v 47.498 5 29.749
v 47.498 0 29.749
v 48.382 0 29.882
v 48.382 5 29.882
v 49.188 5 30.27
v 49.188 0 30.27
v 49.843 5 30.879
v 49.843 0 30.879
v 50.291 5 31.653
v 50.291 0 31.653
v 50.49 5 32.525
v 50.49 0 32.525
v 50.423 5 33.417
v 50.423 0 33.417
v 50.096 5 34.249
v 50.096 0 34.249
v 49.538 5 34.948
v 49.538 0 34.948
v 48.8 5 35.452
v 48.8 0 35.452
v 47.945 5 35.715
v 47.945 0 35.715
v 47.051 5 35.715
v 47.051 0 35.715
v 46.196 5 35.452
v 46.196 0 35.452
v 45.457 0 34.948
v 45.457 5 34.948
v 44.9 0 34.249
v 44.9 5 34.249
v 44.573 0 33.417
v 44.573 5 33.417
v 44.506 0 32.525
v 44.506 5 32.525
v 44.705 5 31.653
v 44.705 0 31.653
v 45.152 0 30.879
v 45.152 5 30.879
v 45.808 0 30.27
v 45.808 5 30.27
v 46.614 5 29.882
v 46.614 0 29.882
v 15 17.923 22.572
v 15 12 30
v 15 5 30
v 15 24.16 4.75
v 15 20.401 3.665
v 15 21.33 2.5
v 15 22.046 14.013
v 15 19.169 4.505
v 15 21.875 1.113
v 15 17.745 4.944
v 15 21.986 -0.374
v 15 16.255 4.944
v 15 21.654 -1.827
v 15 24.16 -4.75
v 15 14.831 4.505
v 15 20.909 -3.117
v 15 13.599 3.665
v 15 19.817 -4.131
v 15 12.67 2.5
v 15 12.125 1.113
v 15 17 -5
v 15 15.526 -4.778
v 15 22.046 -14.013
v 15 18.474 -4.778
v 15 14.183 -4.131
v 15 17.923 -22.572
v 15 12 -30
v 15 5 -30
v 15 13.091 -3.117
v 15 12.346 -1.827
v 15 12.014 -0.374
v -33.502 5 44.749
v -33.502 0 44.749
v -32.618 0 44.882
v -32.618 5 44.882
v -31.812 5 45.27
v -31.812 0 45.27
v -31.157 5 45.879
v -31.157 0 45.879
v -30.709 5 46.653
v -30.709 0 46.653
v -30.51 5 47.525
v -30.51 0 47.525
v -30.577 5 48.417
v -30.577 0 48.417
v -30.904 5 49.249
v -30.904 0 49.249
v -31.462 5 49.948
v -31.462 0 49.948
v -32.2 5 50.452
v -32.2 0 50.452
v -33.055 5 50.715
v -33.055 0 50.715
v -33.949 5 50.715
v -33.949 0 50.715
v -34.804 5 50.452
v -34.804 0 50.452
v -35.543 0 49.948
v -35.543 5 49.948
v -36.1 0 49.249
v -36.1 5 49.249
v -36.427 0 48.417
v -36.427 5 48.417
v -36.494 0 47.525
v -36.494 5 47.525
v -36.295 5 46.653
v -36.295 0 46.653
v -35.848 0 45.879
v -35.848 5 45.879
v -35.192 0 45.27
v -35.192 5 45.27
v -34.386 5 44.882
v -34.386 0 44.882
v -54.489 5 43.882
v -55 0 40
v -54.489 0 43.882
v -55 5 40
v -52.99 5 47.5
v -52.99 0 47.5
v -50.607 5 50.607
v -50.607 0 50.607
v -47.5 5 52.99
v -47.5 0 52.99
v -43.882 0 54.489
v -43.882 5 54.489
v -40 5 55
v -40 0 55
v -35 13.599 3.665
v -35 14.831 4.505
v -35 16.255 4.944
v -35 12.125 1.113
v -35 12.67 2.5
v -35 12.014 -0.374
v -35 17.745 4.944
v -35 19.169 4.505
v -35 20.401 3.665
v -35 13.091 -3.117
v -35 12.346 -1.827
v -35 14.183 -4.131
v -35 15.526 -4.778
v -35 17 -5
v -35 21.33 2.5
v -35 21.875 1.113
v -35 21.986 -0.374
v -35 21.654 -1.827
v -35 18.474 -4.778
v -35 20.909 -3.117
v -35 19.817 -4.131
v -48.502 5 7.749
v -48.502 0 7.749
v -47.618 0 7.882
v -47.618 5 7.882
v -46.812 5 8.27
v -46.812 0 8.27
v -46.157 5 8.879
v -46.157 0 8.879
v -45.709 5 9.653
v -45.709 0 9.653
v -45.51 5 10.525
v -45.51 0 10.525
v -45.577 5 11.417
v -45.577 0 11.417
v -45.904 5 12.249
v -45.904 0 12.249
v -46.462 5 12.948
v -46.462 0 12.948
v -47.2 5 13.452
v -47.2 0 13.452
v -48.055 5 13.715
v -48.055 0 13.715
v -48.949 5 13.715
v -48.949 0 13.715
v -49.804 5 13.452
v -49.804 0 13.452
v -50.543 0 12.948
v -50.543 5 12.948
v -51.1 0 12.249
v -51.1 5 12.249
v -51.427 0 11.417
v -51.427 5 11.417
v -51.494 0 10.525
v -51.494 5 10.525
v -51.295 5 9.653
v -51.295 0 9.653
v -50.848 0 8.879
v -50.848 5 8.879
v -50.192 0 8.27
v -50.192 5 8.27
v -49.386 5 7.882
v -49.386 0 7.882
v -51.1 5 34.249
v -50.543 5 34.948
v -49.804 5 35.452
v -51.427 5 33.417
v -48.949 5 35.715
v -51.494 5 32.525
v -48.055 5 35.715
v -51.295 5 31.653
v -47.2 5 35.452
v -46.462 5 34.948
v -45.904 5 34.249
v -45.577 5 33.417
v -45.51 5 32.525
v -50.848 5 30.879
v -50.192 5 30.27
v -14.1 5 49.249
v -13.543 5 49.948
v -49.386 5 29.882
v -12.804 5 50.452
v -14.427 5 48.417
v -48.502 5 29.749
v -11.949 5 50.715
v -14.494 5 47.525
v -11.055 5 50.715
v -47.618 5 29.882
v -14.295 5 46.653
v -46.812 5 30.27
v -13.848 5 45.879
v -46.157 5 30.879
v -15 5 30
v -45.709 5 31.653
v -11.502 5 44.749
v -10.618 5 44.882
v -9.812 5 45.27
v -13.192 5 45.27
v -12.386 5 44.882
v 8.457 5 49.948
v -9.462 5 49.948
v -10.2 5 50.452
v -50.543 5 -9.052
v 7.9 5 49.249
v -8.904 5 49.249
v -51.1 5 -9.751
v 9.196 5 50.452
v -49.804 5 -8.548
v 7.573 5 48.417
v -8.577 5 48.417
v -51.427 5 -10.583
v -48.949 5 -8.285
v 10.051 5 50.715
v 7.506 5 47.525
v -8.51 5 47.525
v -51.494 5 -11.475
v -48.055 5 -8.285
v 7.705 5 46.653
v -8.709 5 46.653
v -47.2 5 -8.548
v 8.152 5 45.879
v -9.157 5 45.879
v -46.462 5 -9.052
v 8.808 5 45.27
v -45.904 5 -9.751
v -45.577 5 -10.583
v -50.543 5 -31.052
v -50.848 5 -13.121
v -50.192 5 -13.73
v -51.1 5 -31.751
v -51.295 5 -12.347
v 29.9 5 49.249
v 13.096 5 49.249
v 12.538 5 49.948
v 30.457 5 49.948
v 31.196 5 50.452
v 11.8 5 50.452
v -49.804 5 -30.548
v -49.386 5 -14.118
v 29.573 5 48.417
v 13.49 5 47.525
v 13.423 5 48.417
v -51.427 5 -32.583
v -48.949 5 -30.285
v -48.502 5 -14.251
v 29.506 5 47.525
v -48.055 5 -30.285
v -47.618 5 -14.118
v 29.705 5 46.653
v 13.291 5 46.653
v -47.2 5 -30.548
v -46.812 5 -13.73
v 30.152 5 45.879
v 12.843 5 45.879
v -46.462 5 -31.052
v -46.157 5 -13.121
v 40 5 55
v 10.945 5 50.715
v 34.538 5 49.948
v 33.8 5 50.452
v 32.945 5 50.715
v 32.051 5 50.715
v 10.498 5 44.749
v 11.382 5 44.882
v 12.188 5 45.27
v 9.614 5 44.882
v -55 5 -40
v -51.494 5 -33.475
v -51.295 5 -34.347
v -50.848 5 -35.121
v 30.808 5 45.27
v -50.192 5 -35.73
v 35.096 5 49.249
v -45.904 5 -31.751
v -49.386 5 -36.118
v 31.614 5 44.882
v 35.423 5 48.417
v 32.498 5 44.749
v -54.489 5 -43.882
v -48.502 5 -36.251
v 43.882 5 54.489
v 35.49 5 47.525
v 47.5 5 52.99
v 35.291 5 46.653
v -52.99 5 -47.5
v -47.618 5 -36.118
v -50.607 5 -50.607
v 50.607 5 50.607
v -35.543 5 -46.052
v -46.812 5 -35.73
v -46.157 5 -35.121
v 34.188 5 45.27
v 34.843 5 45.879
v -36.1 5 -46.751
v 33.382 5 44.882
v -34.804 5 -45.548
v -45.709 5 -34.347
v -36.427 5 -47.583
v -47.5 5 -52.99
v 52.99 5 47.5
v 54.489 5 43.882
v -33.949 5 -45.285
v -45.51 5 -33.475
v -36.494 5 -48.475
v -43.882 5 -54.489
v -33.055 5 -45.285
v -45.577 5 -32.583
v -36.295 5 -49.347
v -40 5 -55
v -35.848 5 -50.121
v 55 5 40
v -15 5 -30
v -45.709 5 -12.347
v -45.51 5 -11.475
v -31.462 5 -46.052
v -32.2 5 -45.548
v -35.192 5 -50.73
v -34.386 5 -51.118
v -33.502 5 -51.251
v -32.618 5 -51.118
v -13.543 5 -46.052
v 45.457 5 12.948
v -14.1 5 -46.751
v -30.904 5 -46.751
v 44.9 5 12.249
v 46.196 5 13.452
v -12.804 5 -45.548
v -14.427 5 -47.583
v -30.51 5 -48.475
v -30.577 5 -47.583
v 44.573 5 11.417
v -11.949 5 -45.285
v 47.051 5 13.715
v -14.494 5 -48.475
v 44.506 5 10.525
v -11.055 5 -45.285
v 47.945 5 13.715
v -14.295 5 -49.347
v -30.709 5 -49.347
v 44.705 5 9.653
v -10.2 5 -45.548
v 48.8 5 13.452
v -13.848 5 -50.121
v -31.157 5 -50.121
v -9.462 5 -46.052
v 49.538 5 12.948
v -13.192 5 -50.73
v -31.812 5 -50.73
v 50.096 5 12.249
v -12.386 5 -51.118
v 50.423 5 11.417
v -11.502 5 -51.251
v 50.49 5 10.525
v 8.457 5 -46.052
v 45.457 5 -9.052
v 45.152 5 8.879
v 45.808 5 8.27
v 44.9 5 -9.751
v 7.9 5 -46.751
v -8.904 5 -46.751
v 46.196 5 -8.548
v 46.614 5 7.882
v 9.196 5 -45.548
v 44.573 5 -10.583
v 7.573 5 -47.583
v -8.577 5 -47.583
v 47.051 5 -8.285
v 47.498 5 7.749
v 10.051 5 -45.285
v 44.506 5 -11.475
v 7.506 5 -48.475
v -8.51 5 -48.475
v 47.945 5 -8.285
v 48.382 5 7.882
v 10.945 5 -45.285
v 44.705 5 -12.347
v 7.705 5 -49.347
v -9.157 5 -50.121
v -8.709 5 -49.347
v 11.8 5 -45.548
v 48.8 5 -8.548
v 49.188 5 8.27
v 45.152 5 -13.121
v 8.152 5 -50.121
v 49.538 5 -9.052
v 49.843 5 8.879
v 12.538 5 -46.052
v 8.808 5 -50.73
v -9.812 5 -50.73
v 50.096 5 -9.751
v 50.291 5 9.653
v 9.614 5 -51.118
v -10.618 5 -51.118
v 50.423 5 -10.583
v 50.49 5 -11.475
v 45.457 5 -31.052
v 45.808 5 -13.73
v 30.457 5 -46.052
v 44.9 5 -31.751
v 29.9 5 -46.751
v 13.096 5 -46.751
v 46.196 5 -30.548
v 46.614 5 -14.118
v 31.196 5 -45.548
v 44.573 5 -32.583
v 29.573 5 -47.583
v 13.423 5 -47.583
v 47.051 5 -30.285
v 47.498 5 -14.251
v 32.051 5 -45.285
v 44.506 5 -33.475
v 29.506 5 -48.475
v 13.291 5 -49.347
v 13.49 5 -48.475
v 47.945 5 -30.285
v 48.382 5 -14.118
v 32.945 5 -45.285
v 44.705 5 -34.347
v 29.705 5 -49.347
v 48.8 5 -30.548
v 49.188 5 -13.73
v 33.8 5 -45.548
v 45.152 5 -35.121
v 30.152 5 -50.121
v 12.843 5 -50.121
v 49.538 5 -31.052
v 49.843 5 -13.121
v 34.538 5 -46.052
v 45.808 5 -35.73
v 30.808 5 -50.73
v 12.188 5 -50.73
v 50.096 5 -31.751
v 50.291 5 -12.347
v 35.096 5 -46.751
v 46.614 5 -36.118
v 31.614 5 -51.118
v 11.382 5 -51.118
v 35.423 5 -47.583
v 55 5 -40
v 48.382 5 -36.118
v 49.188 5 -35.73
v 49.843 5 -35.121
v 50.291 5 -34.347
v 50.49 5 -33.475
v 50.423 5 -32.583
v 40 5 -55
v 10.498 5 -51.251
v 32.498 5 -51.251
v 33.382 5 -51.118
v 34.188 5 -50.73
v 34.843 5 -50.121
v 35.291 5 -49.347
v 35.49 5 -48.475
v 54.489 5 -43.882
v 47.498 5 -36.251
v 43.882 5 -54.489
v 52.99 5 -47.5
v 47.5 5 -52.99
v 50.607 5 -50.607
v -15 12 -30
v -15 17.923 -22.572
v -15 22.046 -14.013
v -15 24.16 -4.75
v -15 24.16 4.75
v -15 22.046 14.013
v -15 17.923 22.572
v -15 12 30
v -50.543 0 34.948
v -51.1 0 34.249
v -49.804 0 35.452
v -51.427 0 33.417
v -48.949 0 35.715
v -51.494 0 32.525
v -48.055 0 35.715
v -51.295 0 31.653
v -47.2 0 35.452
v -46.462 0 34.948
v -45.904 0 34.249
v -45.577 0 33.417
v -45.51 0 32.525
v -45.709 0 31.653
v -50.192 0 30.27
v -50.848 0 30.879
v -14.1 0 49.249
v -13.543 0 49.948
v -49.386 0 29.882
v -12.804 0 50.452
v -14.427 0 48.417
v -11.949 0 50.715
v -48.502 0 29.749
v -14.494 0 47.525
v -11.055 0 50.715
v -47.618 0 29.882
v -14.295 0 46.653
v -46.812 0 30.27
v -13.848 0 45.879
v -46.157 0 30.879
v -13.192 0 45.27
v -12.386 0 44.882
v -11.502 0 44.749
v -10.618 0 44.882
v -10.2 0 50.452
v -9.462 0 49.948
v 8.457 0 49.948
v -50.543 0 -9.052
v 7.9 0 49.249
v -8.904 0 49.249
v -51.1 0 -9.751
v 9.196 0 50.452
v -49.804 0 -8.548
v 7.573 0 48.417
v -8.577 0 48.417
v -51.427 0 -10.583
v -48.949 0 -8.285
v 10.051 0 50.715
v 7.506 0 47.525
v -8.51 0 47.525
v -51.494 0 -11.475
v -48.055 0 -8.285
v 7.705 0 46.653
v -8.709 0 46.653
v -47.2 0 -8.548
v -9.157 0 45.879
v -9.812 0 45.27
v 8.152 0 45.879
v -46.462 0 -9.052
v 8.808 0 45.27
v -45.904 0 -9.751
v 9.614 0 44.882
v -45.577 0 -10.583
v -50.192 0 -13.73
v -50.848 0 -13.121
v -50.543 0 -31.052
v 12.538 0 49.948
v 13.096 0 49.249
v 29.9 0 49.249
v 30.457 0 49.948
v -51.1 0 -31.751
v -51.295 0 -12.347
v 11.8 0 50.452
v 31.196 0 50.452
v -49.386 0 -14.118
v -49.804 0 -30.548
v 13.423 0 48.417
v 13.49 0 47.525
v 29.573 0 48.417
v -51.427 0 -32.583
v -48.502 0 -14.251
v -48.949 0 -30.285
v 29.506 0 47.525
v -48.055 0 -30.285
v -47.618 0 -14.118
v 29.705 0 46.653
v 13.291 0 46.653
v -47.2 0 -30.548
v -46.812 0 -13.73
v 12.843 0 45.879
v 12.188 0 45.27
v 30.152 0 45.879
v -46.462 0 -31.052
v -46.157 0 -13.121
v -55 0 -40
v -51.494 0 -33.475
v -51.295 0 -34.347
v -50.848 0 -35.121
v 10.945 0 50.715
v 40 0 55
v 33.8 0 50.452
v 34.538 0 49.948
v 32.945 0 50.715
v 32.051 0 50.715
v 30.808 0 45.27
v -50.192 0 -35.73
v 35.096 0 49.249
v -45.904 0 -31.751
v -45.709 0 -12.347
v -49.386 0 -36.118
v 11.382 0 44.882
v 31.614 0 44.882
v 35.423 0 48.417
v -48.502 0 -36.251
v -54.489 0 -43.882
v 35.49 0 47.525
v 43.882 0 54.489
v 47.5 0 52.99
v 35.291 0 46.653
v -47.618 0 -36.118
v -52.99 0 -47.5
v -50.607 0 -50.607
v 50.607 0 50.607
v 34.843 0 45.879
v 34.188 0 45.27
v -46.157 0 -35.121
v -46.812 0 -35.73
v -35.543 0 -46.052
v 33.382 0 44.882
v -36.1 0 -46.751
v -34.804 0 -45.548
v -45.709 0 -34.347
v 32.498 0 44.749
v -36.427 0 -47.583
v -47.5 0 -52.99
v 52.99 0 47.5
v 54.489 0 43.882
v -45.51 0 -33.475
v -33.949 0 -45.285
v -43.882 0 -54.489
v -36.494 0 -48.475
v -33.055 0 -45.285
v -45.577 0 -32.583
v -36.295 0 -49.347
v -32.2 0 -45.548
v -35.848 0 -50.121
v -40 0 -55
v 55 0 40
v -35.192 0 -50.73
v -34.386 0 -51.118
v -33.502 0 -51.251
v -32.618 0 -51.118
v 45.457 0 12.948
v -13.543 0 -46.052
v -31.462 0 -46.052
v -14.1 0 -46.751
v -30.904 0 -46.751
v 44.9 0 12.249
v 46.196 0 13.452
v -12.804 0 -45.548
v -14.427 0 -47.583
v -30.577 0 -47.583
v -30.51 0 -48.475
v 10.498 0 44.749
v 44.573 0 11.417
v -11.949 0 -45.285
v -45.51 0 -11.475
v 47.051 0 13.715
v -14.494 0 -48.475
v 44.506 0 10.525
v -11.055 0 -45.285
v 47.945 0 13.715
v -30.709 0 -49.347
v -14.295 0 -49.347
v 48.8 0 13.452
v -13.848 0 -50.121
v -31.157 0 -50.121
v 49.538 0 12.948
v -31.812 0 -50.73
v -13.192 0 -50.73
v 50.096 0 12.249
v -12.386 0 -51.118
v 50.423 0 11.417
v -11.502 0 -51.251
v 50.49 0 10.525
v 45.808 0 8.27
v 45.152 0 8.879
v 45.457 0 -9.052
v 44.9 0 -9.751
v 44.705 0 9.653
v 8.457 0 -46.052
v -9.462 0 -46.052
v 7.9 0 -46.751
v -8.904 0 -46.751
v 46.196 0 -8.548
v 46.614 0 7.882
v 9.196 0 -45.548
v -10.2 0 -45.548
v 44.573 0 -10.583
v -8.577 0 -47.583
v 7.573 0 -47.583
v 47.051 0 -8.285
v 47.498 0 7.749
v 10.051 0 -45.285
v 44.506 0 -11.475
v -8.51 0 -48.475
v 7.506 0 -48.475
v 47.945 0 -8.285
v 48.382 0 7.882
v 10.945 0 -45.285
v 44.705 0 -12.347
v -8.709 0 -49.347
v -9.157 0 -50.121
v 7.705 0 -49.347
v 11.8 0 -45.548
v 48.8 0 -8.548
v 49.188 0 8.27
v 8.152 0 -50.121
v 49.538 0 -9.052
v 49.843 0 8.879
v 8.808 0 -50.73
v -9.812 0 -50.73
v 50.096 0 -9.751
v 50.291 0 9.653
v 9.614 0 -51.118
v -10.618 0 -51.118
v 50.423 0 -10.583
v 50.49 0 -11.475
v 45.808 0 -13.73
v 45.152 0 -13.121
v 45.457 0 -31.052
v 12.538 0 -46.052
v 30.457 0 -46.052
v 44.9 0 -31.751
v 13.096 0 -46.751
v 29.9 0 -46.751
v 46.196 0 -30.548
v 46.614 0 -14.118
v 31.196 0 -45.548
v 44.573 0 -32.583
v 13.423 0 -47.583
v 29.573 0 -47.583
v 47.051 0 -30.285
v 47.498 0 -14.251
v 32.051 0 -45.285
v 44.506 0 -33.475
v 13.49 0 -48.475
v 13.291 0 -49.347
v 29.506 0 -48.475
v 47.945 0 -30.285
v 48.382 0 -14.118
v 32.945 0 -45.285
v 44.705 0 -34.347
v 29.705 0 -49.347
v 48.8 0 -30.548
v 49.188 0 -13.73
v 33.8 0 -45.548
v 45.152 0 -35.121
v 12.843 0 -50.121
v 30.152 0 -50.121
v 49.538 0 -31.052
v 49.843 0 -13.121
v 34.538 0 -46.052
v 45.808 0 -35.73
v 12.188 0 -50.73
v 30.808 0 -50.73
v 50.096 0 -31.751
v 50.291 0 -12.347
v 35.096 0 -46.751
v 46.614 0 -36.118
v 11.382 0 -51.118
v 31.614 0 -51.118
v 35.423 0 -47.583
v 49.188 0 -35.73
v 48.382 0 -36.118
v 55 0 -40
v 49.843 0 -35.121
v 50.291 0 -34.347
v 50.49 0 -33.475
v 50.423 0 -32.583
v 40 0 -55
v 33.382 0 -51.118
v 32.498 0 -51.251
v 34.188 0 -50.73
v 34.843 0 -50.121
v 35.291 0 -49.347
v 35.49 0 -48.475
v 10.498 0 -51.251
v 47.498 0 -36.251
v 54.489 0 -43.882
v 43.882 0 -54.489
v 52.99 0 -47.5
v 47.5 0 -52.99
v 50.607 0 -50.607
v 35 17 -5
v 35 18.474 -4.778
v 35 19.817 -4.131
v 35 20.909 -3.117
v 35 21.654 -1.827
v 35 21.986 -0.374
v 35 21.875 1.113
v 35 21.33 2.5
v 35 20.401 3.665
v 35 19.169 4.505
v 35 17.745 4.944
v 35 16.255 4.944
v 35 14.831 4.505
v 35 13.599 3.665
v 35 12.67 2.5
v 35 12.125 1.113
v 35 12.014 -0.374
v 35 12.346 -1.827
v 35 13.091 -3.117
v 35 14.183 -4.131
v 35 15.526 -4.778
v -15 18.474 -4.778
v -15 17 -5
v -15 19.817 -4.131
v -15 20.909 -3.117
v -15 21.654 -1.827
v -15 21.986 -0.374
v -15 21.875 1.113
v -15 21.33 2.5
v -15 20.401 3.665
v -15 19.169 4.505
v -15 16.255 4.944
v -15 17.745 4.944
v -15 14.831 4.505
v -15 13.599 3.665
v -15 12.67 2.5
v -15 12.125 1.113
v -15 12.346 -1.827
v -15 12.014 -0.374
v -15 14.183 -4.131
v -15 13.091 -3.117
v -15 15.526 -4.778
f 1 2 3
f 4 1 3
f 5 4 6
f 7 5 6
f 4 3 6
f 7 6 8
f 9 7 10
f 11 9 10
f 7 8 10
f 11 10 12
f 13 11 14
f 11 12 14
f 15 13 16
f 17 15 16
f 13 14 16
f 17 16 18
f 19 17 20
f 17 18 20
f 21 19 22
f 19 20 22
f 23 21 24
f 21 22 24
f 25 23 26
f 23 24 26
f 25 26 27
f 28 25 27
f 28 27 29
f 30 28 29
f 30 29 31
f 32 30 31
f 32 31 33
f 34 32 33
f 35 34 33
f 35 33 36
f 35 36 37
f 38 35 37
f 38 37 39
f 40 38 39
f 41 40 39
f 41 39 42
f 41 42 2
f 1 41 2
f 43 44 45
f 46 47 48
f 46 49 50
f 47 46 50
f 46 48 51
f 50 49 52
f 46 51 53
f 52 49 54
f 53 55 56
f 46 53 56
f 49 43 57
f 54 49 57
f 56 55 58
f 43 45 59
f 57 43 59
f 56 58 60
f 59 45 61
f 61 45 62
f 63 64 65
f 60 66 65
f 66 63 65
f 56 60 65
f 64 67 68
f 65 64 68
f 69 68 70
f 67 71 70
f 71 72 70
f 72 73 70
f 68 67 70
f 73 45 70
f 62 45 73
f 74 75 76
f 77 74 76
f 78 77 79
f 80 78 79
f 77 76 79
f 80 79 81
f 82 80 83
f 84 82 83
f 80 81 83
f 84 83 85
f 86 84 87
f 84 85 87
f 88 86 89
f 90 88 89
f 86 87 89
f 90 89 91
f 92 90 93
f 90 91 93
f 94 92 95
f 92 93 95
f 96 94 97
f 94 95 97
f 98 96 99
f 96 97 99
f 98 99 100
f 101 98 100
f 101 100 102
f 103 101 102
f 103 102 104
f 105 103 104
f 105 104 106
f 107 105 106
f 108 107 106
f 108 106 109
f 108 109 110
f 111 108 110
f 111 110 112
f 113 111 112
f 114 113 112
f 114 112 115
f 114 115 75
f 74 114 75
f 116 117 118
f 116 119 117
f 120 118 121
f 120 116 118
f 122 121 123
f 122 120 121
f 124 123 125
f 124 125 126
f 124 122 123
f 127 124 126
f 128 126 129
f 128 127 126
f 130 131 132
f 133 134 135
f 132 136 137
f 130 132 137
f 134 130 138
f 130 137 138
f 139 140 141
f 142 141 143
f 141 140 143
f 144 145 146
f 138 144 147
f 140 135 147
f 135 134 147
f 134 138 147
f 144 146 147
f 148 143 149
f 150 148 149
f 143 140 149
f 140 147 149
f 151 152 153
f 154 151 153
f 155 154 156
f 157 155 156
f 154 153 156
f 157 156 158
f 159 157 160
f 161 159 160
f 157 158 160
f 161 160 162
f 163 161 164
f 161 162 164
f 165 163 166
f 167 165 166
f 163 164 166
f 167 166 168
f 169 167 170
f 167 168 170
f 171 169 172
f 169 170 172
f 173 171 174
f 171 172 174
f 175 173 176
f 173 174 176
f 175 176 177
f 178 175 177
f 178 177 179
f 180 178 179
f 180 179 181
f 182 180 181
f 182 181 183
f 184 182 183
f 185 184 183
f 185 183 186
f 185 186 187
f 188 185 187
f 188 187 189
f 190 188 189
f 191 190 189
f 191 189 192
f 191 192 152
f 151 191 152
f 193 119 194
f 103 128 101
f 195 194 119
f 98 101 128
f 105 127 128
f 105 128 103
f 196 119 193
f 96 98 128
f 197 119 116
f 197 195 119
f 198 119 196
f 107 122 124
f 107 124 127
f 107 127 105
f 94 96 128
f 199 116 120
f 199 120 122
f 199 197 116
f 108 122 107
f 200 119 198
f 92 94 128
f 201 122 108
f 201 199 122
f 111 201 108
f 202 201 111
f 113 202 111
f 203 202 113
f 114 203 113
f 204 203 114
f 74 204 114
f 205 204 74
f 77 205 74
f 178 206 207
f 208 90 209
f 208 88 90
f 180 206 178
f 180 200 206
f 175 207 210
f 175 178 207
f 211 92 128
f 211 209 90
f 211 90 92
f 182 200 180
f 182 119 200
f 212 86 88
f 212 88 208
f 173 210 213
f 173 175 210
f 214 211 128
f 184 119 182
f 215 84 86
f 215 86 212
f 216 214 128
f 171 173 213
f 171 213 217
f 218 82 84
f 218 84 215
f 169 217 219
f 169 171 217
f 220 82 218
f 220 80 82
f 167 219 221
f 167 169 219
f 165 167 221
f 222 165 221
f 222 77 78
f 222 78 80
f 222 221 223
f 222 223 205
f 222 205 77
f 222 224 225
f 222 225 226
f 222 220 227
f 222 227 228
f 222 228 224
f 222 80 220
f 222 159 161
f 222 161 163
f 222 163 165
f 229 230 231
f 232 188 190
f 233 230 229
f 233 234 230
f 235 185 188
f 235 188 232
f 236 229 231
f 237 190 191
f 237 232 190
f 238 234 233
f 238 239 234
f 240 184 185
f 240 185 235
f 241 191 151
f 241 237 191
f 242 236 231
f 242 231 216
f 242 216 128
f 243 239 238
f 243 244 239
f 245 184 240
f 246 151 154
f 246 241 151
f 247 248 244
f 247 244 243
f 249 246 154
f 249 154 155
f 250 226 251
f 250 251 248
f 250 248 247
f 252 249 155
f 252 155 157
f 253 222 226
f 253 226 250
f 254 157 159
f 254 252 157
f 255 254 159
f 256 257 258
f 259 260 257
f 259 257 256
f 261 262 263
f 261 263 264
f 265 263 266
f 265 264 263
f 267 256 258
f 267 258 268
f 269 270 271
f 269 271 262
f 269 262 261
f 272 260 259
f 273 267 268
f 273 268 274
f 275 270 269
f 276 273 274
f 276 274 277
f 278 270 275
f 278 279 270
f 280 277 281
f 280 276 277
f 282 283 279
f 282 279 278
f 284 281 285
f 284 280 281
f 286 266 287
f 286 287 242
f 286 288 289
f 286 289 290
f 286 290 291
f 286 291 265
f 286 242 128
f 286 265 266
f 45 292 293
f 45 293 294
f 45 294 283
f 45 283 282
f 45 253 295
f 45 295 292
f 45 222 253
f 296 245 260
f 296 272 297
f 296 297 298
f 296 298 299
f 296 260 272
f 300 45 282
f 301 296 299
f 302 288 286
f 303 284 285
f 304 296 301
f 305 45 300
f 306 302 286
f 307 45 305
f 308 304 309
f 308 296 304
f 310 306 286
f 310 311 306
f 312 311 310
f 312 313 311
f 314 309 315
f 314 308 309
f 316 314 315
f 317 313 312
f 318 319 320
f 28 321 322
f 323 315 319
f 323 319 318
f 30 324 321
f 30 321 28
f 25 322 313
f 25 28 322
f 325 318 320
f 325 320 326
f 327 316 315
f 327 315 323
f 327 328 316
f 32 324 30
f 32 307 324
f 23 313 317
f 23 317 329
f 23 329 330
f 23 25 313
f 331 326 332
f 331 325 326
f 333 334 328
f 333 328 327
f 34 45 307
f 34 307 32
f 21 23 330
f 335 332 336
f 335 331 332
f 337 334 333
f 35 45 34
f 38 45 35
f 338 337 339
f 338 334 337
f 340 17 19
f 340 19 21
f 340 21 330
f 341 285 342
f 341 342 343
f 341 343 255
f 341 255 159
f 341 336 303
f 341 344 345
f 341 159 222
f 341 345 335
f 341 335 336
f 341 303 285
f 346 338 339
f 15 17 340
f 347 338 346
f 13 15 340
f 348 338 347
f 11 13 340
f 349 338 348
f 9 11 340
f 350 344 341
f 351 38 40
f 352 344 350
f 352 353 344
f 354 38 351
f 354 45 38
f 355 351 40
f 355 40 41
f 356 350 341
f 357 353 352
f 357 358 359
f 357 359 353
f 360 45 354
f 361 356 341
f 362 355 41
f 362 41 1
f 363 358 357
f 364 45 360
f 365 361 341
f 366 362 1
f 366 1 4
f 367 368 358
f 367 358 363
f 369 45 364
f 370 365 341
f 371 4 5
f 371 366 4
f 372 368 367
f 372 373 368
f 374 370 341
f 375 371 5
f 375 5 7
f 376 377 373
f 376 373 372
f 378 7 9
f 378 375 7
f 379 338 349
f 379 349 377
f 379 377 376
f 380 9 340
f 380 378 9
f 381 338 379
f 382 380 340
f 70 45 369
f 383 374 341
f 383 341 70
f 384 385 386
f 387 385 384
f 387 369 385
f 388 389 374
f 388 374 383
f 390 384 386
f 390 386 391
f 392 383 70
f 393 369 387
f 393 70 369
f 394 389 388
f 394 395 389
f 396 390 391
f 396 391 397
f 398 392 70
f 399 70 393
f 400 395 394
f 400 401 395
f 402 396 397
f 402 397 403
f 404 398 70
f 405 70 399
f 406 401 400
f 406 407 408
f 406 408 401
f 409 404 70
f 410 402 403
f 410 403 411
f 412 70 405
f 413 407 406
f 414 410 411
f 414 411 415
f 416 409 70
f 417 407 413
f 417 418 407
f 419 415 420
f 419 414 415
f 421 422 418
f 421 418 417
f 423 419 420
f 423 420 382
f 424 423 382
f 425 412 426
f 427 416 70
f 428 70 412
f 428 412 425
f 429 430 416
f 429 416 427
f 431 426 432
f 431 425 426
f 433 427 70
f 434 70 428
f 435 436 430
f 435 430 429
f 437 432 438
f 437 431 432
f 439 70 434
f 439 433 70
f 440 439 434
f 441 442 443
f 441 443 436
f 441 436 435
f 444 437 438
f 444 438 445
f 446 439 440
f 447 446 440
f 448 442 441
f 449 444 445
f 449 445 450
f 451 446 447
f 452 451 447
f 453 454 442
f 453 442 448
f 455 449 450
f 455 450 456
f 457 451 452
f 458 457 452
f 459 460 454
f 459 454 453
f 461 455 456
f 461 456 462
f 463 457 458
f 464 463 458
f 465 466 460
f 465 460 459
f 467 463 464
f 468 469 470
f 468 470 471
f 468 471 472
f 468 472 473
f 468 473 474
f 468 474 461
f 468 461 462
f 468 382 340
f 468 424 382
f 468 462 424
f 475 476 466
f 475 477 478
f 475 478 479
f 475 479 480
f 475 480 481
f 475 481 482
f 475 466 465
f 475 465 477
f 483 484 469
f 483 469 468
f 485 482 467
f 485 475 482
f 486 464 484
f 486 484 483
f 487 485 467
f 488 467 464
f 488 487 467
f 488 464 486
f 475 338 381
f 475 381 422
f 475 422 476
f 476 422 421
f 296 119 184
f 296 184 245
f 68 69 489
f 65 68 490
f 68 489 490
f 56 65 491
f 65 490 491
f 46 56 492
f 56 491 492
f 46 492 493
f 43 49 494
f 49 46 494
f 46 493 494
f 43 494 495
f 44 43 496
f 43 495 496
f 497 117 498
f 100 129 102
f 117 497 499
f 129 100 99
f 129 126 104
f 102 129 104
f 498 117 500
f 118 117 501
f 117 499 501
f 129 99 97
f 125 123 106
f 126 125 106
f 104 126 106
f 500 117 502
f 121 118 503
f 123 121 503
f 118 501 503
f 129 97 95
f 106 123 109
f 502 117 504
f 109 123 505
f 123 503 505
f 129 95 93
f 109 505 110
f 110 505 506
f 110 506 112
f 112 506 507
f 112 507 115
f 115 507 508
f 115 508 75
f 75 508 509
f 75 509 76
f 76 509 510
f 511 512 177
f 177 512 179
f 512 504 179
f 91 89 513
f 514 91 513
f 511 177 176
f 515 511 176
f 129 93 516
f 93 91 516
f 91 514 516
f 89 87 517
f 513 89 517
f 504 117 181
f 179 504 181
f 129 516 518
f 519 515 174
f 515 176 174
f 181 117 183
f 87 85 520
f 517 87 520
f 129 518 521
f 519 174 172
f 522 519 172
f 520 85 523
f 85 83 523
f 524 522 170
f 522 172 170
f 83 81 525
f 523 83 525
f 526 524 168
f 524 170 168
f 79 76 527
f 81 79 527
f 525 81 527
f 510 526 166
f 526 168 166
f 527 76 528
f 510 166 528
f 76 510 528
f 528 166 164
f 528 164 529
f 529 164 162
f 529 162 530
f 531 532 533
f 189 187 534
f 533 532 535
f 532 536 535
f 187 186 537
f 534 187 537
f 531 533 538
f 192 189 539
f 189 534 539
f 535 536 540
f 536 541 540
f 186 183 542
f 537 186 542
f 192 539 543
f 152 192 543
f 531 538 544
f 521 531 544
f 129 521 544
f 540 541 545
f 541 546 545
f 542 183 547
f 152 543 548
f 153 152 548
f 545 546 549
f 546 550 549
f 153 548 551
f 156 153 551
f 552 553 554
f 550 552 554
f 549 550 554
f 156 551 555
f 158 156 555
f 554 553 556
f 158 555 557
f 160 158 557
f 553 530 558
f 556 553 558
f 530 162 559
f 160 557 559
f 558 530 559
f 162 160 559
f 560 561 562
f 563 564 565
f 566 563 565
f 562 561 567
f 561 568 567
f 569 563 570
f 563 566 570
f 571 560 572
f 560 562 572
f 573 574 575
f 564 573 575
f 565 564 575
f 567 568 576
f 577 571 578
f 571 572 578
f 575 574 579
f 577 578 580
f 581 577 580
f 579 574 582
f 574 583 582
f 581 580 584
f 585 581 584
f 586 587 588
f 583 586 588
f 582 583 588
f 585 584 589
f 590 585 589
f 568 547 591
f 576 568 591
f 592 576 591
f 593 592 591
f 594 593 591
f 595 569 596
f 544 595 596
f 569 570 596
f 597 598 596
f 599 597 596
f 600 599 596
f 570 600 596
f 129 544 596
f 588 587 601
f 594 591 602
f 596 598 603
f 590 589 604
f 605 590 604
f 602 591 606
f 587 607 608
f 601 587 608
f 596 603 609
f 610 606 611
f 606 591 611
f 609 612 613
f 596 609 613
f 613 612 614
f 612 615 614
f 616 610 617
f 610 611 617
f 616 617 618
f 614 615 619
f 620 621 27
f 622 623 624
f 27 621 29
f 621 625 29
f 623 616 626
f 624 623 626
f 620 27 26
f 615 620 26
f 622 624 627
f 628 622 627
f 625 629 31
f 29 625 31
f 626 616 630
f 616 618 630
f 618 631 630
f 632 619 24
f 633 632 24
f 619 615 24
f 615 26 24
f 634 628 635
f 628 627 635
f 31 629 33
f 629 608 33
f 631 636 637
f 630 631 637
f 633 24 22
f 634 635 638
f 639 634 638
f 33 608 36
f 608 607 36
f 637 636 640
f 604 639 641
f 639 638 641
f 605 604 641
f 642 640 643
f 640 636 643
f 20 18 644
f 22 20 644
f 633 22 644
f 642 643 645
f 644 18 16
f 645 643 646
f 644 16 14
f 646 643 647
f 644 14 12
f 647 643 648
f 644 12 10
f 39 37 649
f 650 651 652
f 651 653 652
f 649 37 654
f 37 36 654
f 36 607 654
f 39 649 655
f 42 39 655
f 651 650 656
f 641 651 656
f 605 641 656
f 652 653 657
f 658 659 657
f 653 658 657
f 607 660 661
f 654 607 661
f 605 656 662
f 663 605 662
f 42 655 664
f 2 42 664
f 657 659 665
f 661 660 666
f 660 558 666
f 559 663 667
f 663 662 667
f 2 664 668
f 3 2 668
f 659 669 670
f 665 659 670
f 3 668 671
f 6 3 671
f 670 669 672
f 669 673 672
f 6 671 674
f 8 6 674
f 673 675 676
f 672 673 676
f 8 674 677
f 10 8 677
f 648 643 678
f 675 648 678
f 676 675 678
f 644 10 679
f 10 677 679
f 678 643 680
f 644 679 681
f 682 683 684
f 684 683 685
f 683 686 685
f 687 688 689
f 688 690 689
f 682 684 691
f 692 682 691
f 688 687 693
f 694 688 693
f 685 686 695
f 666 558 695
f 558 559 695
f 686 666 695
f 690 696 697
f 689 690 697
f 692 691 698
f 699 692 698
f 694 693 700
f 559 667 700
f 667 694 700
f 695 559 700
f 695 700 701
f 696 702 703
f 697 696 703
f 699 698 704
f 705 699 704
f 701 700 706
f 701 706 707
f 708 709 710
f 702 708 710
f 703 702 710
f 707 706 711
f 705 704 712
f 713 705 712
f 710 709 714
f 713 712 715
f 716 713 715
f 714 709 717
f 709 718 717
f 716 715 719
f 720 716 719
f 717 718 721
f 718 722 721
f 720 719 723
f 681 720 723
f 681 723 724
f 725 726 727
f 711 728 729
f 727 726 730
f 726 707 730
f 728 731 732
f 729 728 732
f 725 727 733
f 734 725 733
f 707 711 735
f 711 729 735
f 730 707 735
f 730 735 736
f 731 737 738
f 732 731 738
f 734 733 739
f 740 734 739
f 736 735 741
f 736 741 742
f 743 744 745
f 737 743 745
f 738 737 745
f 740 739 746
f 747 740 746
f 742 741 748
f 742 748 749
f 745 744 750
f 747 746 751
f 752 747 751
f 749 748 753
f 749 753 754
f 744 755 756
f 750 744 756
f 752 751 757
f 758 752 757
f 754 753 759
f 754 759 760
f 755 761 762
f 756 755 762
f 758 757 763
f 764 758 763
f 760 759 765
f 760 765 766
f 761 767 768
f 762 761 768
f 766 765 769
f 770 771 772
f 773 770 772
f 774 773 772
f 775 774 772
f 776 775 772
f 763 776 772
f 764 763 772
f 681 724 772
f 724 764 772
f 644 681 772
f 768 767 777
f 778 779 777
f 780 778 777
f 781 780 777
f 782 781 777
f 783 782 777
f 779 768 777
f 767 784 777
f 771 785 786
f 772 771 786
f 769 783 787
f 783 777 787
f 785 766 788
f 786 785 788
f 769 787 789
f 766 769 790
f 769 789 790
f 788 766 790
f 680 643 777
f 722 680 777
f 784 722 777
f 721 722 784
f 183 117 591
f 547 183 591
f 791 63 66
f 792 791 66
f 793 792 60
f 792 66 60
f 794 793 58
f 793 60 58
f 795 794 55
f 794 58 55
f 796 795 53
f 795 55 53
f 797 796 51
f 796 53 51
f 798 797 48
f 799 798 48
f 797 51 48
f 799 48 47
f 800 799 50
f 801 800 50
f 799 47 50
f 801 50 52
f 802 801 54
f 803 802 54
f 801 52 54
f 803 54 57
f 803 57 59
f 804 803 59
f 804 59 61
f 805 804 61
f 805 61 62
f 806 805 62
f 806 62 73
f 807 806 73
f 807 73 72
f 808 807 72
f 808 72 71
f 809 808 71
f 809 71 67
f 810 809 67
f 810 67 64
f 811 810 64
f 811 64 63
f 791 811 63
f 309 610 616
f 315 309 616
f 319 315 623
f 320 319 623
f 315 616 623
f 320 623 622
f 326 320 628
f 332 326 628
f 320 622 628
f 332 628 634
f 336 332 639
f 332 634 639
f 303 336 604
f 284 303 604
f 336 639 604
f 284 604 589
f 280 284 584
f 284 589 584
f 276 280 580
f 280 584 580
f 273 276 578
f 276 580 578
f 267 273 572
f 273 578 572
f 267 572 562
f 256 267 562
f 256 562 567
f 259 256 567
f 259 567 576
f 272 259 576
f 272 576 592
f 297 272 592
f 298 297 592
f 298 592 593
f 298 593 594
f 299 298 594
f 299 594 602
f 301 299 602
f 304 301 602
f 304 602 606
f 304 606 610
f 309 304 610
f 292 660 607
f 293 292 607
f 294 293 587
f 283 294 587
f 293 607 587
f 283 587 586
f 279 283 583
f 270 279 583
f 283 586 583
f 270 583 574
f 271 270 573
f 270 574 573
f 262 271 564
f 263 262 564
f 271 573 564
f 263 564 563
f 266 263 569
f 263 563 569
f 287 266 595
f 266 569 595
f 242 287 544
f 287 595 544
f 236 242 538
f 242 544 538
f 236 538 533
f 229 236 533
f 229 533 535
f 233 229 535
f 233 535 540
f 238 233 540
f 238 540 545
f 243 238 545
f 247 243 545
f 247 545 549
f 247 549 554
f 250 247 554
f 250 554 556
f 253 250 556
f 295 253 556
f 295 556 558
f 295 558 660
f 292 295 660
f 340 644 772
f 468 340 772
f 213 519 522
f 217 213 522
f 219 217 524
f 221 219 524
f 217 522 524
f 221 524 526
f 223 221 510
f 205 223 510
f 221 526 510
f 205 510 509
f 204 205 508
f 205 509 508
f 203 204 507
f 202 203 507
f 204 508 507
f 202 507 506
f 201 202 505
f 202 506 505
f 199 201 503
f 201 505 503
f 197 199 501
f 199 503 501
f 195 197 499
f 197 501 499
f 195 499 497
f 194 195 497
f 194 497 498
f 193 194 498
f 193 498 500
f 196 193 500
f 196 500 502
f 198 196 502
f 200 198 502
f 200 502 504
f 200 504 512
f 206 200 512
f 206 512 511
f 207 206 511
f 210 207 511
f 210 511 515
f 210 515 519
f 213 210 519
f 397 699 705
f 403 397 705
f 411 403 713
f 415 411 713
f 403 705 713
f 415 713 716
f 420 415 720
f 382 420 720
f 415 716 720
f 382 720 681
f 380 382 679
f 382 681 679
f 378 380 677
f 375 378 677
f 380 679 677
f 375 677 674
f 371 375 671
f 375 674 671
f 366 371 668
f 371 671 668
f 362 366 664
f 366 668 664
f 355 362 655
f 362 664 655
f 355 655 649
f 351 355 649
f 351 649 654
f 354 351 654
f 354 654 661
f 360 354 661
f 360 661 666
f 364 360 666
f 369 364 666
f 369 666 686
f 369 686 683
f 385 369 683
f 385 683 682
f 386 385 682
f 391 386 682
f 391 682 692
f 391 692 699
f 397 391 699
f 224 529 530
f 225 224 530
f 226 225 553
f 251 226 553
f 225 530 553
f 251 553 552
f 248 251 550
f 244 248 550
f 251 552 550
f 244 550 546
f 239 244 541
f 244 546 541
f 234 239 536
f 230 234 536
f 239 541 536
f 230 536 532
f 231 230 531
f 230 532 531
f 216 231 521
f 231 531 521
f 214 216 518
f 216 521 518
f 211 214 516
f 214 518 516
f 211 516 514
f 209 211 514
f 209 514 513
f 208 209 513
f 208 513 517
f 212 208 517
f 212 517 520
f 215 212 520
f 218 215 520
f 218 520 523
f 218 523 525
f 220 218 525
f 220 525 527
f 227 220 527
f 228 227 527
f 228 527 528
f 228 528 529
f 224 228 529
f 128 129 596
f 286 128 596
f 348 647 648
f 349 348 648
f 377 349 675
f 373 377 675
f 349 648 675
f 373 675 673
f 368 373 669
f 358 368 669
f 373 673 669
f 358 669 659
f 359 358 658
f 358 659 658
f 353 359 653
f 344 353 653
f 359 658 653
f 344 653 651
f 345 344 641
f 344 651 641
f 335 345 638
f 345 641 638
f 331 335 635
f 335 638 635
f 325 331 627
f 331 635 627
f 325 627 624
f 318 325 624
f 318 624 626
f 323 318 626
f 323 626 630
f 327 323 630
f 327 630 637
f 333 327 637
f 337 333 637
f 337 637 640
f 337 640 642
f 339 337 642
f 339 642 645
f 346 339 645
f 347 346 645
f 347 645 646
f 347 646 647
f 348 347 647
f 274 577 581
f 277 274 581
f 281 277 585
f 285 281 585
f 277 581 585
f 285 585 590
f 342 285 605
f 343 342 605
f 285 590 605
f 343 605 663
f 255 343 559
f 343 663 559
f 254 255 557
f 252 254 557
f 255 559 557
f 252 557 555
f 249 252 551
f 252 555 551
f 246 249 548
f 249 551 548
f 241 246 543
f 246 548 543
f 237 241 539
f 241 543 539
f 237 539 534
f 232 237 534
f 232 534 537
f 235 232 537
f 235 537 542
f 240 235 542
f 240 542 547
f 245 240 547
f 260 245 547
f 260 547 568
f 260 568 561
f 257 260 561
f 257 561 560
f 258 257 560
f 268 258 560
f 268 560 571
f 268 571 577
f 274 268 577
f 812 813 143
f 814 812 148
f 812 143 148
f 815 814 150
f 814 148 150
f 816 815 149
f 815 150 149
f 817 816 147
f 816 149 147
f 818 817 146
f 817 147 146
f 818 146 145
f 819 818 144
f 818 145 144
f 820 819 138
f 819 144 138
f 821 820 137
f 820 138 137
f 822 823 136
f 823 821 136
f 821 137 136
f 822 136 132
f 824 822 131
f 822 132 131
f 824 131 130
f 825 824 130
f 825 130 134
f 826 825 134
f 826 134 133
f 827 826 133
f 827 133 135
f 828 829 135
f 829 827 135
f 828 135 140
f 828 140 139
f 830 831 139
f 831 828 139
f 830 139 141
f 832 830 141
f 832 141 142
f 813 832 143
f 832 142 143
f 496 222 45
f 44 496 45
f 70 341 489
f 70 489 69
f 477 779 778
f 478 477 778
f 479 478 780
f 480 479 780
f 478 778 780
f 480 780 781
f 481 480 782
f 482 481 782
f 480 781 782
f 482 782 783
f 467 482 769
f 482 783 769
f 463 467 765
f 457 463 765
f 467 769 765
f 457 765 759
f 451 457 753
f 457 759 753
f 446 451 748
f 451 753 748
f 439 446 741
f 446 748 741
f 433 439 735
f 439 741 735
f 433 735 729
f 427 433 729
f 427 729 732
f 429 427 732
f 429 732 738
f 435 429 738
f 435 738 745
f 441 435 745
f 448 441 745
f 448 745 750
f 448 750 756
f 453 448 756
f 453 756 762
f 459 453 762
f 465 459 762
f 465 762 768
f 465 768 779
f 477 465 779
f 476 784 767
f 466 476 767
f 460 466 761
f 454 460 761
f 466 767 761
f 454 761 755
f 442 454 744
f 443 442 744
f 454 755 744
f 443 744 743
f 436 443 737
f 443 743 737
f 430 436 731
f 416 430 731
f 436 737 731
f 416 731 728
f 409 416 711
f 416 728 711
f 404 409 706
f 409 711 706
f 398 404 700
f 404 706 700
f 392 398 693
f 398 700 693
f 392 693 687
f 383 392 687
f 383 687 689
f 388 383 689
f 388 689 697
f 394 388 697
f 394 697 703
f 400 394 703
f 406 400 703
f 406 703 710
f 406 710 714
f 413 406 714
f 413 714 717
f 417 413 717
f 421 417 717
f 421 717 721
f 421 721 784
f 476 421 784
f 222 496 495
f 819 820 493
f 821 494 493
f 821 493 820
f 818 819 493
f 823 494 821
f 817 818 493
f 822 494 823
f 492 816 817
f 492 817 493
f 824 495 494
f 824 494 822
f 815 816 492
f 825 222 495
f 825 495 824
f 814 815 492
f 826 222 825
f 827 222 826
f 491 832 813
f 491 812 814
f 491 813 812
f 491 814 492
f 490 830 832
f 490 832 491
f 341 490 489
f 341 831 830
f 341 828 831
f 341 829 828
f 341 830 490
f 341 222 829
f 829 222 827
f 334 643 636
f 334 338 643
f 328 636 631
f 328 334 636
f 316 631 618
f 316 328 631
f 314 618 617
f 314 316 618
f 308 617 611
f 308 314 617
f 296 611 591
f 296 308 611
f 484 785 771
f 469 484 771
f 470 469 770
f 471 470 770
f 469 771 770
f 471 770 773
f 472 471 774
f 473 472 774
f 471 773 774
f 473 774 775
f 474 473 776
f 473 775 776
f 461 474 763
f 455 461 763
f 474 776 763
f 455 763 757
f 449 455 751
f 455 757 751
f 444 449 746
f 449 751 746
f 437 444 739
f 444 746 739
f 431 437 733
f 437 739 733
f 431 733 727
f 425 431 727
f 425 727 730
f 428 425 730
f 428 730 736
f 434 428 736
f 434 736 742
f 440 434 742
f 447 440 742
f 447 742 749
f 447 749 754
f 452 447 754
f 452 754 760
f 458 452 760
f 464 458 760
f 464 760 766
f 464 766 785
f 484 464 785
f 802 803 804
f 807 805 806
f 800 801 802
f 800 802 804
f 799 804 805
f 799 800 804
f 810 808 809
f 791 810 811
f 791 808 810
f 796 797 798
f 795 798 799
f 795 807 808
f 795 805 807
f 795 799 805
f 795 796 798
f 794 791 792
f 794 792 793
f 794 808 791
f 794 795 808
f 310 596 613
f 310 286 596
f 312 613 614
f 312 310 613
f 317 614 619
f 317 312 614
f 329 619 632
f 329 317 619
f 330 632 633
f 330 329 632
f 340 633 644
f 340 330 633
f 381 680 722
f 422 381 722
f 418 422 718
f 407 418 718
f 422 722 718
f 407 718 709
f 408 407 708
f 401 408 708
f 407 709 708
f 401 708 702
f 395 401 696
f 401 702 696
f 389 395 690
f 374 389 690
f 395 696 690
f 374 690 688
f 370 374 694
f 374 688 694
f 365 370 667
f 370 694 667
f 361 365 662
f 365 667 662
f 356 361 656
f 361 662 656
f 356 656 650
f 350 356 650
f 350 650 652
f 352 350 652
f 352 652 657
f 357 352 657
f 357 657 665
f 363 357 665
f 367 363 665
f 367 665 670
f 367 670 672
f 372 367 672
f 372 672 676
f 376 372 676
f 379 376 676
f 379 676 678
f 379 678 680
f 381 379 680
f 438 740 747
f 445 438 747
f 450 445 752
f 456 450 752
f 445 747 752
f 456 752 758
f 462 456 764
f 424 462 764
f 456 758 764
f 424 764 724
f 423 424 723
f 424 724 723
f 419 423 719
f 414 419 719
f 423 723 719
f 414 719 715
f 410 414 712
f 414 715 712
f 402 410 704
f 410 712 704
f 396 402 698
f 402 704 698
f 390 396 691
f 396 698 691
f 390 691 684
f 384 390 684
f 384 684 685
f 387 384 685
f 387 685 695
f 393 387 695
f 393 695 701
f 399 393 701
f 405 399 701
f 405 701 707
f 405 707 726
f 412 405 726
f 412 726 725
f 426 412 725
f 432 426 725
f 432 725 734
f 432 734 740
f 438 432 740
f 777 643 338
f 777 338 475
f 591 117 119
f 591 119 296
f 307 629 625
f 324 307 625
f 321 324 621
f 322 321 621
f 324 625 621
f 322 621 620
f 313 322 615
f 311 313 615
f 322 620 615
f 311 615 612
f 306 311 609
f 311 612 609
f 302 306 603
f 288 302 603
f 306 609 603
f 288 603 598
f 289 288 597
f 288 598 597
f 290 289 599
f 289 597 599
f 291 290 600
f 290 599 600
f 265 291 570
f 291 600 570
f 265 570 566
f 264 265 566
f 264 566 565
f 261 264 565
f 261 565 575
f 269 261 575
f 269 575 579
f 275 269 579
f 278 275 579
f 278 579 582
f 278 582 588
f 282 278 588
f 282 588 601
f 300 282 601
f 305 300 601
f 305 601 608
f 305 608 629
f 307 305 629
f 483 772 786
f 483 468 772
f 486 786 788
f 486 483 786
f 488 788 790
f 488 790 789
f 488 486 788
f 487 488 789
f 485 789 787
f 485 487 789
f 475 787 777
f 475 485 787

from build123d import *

# Parameters (mm, degrees)
SKETCH1_W                = 110
SKETCH1_H                = 110
BOSS_EXTRUDE1_DEPTH      = 5
FILLET2_R                = 15
FILLET3_R                = 15
FILLET4_R                = 15
FILLET5_R                = 15
SKETCH2_W                = 30
SKETCH2_H                = 60
BOSS_EXTRUDE2_DEPTH      = 24
BOSS_EXTRUDE3_DEPTH      = 20
BOSS_EXTRUDE3_DEPTH_BACK = 50
SKETCH4_R                = 5
FILLET6_R                = 10
FILLET7_R                = 10
SKETCH5_R                = 3
CUT_EXTRUDE2_DEPTH       = 10
CUT_EXTRUDE3_DEPTH       = 60


with BuildPart() as part:
    # Sketch1 → Boss-Extrude1 (new body)
    with BuildSketch(Plane(origin=(0, 0, 0), x_dir=(1, 0, 0), z_dir=(0, 1, 0))):
        Rectangle(SKETCH1_W, SKETCH1_H)
    extrude(amount=BOSS_EXTRUDE1_DEPTH)

    # Fillet2
    fillet2_edges = [part.edges().sort_by_distance(p)[0] for p in [
        (55, 2.5, -55),
    ]]
    fillet(fillet2_edges, radius=FILLET2_R)

    # Fillet3
    fillet3_edges = [part.edges().sort_by_distance(p)[0] for p in [
        (-55, 2.5, -55),
    ]]
    fillet(fillet3_edges, radius=FILLET3_R)

    # Fillet4
    fillet4_edges = [part.edges().sort_by_distance(p)[0] for p in [
        (-55, 2.5, 55),
    ]]
    fillet(fillet4_edges, radius=FILLET4_R)

    # Fillet5
    fillet5_edges = [part.edges().sort_by_distance(p)[0] for p in [
        (55, 2.5, 55),
    ]]
    fillet(fillet5_edges, radius=FILLET5_R)

    # Sketch2 → Boss-Extrude2 (add)
    with BuildSketch(Plane(origin=(0, 5, 0), x_dir=(1, 0, 0), z_dir=(0, 1, 0))):
        Rectangle(SKETCH2_W, SKETCH2_H)
    extrude(amount=BOSS_EXTRUDE2_DEPTH)

    # Sketch4 → Boss-Extrude3 (add, two sides: drawn at the far end of the back side and taken through both)
    with BuildSketch(Plane(origin=(15, 0, 0), x_dir=(0, 0, -1), z_dir=(1, 0, 0)).offset(-BOSS_EXTRUDE3_DEPTH_BACK)):
        with Locations((0, 17)):
            Circle(SKETCH4_R)
    extrude(amount=BOSS_EXTRUDE3_DEPTH + BOSS_EXTRUDE3_DEPTH_BACK)

    # Fillet6
    fillet6_edges = [part.edges().sort_by_distance(p)[0] for p in [
        (0, 29, 30),
    ]]
    fillet(fillet6_edges, radius=FILLET6_R)

    # Fillet7
    fillet7_edges = [part.edges().sort_by_distance(p)[0] for p in [
        (0, 29, -30),
    ]]
    fillet(fillet7_edges, radius=FILLET7_R)

    # Sketch5 → Cut-Extrude2 (cut)
    with BuildSketch(Plane.XZ):
        with Locations(Location((47.497955542, -11.251022229, 0), (0, 0, 270))):
            Circle(SKETCH5_R)
        with Locations(Location((47.497955542, 32.748977771, 0), (0, 0, 270))):
            Circle(SKETCH5_R)
        with Locations(Location((-48.502044458, 10.748977771, 0), (0, 0, 270))):
            Circle(SKETCH5_R)
        with Locations(Location((-48.502044458, -11.251022229, 0), (0, 0, 270))):
            Circle(SKETCH5_R)
        with Locations(Location((-48.502044458, -33.251022229, 0), (0, 0, 270))):
            Circle(SKETCH5_R)
        with Locations(Location((-33.502044458, -48.251022229, 0), (0, 0, 270))):
            Circle(SKETCH5_R)
        with Locations(Location((-11.502044458, -48.251022229, 0), (0, 0, 270))):
            Circle(SKETCH5_R)
        with Locations(Location((10.497955542, -48.251022229, 0), (0, 0, 270))):
            Circle(SKETCH5_R)
        with Locations(Location((32.497955542, -48.251022229, 0), (0, 0, 270))):
            Circle(SKETCH5_R)
        with Locations(Location((47.497955542, -33.251022229, 0), (0, 0, 270))):
            Circle(SKETCH5_R)
        with Locations(Location((47.497955542, 10.748977771, 0), (0, 0, 270))):
            Circle(SKETCH5_R)
        with Locations(Location((32.497955542, 47.748977771, 0), (0, 0, 270))):
            Circle(SKETCH5_R)
        with Locations(Location((10.497955542, 47.748977771, 0), (0, 0, 270))):
            Circle(SKETCH5_R)
        with Locations(Location((-11.502044458, 47.748977771, 0), (0, 0, 270))):
            Circle(SKETCH5_R)
        with Locations(Location((-33.502044458, 47.748977771, 0), (0, 0, 270))):
            Circle(SKETCH5_R)
        with Locations(Location((-48.502044458, 32.748977771, 0), (0, 0, 270))):
            Circle(SKETCH5_R)
    extrude(amount=-CUT_EXTRUDE2_DEPTH, mode=Mode.SUBTRACT)

    # Sketch8 → Cut-Extrude3 (cut)
    with BuildSketch(Plane.ZY.offset(15)):
        with BuildLine():
            Line((-30, 19), (-30, 12))
            ThreePointArc((-30, 12), (0, 24.426406871), (30, 12))
            Line((30, 12), (30, 19))
            ThreePointArc((30, 19), (27.071067812, 26.071067812), (20, 29))
            Line((20, 29), (-20, 29))
            ThreePointArc((-20, 29), (-27.071067812, 26.071067812), (-30, 19))
        make_face()
    extrude(amount=-CUT_EXTRUDE3_DEPTH, mode=Mode.SUBTRACT)


solid = part.part
